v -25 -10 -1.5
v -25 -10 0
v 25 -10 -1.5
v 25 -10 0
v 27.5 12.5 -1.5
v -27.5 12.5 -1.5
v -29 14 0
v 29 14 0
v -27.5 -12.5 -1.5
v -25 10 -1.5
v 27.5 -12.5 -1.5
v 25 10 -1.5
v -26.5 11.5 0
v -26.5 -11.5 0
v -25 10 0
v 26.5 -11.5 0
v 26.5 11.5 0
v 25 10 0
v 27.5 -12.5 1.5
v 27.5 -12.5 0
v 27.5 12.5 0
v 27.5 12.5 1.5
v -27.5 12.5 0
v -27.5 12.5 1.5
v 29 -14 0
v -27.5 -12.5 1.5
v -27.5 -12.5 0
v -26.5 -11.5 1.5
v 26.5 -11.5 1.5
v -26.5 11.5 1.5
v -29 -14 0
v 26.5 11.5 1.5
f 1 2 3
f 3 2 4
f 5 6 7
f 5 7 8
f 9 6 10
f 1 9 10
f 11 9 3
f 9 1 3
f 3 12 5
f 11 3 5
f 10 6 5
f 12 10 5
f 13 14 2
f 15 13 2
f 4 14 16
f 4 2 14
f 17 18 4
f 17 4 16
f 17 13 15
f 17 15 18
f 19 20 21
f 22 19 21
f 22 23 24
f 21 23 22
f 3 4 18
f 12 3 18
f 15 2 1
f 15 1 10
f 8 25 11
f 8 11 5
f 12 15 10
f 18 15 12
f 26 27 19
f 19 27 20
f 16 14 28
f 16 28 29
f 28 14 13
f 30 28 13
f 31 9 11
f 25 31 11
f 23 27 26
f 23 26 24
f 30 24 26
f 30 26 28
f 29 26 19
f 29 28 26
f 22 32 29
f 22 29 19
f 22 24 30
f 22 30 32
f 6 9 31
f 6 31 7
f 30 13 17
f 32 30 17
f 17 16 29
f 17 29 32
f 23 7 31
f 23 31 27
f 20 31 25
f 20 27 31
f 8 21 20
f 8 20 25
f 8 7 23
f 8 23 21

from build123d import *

# Parameters (mm, degrees)
F0_W     = 58
F0_H     = 28
F0_W_2   = 55
F0_H_2   = 25
F0_W_3   = 53
F0_H_3   = 23
F0_W_4   = 50
F0_H_4   = 20
F1_DEPTH = 1.5
F2_DEPTH = 1.5
F3_SIZE  = 1.49999


# Not quite as in the source:
# - a fillet or chamfer is up to 0.001 mm smaller than in the source, because OpenCascade refuses the exact size


with BuildPart() as f1:
    # F0 (on Top) → F1 (new body)
    with BuildSketch(Plane.XY):
        Rectangle(F0_W, F0_H)
        Rectangle(F0_W_2, F0_H_2, mode=Mode.SUBTRACT)
        Rectangle(F0_W_2, F0_H_2)
        Rectangle(F0_W_3, F0_H_3, mode=Mode.SUBTRACT)
        Rectangle(F0_W_3, F0_H_3)
        Rectangle(F0_W_4, F0_H_4, mode=Mode.SUBTRACT)
    extrude(amount=-F1_DEPTH)

    # F0 (on Top) → F2 (join)
    with BuildSketch(Plane.XY):
        Rectangle(F0_W_2, F0_H_2)
        Rectangle(F0_W_3, F0_H_3, mode=Mode.SUBTRACT)
    extrude(amount=F2_DEPTH)

    # F3 (size 1.5 in the source; OpenCascade refuses exactly that, so slightly less here)
    f3_edges = [f1.edges().sort_by_distance(p)[0] for p in [
        (0, -14, -1.5),
        (-29, 0, -1.5),
        (0, 14, -1.5),
        (29, 0, -1.5),
    ]]
    chamfer(f3_edges, length=F3_SIZE)


solid = f1.part
